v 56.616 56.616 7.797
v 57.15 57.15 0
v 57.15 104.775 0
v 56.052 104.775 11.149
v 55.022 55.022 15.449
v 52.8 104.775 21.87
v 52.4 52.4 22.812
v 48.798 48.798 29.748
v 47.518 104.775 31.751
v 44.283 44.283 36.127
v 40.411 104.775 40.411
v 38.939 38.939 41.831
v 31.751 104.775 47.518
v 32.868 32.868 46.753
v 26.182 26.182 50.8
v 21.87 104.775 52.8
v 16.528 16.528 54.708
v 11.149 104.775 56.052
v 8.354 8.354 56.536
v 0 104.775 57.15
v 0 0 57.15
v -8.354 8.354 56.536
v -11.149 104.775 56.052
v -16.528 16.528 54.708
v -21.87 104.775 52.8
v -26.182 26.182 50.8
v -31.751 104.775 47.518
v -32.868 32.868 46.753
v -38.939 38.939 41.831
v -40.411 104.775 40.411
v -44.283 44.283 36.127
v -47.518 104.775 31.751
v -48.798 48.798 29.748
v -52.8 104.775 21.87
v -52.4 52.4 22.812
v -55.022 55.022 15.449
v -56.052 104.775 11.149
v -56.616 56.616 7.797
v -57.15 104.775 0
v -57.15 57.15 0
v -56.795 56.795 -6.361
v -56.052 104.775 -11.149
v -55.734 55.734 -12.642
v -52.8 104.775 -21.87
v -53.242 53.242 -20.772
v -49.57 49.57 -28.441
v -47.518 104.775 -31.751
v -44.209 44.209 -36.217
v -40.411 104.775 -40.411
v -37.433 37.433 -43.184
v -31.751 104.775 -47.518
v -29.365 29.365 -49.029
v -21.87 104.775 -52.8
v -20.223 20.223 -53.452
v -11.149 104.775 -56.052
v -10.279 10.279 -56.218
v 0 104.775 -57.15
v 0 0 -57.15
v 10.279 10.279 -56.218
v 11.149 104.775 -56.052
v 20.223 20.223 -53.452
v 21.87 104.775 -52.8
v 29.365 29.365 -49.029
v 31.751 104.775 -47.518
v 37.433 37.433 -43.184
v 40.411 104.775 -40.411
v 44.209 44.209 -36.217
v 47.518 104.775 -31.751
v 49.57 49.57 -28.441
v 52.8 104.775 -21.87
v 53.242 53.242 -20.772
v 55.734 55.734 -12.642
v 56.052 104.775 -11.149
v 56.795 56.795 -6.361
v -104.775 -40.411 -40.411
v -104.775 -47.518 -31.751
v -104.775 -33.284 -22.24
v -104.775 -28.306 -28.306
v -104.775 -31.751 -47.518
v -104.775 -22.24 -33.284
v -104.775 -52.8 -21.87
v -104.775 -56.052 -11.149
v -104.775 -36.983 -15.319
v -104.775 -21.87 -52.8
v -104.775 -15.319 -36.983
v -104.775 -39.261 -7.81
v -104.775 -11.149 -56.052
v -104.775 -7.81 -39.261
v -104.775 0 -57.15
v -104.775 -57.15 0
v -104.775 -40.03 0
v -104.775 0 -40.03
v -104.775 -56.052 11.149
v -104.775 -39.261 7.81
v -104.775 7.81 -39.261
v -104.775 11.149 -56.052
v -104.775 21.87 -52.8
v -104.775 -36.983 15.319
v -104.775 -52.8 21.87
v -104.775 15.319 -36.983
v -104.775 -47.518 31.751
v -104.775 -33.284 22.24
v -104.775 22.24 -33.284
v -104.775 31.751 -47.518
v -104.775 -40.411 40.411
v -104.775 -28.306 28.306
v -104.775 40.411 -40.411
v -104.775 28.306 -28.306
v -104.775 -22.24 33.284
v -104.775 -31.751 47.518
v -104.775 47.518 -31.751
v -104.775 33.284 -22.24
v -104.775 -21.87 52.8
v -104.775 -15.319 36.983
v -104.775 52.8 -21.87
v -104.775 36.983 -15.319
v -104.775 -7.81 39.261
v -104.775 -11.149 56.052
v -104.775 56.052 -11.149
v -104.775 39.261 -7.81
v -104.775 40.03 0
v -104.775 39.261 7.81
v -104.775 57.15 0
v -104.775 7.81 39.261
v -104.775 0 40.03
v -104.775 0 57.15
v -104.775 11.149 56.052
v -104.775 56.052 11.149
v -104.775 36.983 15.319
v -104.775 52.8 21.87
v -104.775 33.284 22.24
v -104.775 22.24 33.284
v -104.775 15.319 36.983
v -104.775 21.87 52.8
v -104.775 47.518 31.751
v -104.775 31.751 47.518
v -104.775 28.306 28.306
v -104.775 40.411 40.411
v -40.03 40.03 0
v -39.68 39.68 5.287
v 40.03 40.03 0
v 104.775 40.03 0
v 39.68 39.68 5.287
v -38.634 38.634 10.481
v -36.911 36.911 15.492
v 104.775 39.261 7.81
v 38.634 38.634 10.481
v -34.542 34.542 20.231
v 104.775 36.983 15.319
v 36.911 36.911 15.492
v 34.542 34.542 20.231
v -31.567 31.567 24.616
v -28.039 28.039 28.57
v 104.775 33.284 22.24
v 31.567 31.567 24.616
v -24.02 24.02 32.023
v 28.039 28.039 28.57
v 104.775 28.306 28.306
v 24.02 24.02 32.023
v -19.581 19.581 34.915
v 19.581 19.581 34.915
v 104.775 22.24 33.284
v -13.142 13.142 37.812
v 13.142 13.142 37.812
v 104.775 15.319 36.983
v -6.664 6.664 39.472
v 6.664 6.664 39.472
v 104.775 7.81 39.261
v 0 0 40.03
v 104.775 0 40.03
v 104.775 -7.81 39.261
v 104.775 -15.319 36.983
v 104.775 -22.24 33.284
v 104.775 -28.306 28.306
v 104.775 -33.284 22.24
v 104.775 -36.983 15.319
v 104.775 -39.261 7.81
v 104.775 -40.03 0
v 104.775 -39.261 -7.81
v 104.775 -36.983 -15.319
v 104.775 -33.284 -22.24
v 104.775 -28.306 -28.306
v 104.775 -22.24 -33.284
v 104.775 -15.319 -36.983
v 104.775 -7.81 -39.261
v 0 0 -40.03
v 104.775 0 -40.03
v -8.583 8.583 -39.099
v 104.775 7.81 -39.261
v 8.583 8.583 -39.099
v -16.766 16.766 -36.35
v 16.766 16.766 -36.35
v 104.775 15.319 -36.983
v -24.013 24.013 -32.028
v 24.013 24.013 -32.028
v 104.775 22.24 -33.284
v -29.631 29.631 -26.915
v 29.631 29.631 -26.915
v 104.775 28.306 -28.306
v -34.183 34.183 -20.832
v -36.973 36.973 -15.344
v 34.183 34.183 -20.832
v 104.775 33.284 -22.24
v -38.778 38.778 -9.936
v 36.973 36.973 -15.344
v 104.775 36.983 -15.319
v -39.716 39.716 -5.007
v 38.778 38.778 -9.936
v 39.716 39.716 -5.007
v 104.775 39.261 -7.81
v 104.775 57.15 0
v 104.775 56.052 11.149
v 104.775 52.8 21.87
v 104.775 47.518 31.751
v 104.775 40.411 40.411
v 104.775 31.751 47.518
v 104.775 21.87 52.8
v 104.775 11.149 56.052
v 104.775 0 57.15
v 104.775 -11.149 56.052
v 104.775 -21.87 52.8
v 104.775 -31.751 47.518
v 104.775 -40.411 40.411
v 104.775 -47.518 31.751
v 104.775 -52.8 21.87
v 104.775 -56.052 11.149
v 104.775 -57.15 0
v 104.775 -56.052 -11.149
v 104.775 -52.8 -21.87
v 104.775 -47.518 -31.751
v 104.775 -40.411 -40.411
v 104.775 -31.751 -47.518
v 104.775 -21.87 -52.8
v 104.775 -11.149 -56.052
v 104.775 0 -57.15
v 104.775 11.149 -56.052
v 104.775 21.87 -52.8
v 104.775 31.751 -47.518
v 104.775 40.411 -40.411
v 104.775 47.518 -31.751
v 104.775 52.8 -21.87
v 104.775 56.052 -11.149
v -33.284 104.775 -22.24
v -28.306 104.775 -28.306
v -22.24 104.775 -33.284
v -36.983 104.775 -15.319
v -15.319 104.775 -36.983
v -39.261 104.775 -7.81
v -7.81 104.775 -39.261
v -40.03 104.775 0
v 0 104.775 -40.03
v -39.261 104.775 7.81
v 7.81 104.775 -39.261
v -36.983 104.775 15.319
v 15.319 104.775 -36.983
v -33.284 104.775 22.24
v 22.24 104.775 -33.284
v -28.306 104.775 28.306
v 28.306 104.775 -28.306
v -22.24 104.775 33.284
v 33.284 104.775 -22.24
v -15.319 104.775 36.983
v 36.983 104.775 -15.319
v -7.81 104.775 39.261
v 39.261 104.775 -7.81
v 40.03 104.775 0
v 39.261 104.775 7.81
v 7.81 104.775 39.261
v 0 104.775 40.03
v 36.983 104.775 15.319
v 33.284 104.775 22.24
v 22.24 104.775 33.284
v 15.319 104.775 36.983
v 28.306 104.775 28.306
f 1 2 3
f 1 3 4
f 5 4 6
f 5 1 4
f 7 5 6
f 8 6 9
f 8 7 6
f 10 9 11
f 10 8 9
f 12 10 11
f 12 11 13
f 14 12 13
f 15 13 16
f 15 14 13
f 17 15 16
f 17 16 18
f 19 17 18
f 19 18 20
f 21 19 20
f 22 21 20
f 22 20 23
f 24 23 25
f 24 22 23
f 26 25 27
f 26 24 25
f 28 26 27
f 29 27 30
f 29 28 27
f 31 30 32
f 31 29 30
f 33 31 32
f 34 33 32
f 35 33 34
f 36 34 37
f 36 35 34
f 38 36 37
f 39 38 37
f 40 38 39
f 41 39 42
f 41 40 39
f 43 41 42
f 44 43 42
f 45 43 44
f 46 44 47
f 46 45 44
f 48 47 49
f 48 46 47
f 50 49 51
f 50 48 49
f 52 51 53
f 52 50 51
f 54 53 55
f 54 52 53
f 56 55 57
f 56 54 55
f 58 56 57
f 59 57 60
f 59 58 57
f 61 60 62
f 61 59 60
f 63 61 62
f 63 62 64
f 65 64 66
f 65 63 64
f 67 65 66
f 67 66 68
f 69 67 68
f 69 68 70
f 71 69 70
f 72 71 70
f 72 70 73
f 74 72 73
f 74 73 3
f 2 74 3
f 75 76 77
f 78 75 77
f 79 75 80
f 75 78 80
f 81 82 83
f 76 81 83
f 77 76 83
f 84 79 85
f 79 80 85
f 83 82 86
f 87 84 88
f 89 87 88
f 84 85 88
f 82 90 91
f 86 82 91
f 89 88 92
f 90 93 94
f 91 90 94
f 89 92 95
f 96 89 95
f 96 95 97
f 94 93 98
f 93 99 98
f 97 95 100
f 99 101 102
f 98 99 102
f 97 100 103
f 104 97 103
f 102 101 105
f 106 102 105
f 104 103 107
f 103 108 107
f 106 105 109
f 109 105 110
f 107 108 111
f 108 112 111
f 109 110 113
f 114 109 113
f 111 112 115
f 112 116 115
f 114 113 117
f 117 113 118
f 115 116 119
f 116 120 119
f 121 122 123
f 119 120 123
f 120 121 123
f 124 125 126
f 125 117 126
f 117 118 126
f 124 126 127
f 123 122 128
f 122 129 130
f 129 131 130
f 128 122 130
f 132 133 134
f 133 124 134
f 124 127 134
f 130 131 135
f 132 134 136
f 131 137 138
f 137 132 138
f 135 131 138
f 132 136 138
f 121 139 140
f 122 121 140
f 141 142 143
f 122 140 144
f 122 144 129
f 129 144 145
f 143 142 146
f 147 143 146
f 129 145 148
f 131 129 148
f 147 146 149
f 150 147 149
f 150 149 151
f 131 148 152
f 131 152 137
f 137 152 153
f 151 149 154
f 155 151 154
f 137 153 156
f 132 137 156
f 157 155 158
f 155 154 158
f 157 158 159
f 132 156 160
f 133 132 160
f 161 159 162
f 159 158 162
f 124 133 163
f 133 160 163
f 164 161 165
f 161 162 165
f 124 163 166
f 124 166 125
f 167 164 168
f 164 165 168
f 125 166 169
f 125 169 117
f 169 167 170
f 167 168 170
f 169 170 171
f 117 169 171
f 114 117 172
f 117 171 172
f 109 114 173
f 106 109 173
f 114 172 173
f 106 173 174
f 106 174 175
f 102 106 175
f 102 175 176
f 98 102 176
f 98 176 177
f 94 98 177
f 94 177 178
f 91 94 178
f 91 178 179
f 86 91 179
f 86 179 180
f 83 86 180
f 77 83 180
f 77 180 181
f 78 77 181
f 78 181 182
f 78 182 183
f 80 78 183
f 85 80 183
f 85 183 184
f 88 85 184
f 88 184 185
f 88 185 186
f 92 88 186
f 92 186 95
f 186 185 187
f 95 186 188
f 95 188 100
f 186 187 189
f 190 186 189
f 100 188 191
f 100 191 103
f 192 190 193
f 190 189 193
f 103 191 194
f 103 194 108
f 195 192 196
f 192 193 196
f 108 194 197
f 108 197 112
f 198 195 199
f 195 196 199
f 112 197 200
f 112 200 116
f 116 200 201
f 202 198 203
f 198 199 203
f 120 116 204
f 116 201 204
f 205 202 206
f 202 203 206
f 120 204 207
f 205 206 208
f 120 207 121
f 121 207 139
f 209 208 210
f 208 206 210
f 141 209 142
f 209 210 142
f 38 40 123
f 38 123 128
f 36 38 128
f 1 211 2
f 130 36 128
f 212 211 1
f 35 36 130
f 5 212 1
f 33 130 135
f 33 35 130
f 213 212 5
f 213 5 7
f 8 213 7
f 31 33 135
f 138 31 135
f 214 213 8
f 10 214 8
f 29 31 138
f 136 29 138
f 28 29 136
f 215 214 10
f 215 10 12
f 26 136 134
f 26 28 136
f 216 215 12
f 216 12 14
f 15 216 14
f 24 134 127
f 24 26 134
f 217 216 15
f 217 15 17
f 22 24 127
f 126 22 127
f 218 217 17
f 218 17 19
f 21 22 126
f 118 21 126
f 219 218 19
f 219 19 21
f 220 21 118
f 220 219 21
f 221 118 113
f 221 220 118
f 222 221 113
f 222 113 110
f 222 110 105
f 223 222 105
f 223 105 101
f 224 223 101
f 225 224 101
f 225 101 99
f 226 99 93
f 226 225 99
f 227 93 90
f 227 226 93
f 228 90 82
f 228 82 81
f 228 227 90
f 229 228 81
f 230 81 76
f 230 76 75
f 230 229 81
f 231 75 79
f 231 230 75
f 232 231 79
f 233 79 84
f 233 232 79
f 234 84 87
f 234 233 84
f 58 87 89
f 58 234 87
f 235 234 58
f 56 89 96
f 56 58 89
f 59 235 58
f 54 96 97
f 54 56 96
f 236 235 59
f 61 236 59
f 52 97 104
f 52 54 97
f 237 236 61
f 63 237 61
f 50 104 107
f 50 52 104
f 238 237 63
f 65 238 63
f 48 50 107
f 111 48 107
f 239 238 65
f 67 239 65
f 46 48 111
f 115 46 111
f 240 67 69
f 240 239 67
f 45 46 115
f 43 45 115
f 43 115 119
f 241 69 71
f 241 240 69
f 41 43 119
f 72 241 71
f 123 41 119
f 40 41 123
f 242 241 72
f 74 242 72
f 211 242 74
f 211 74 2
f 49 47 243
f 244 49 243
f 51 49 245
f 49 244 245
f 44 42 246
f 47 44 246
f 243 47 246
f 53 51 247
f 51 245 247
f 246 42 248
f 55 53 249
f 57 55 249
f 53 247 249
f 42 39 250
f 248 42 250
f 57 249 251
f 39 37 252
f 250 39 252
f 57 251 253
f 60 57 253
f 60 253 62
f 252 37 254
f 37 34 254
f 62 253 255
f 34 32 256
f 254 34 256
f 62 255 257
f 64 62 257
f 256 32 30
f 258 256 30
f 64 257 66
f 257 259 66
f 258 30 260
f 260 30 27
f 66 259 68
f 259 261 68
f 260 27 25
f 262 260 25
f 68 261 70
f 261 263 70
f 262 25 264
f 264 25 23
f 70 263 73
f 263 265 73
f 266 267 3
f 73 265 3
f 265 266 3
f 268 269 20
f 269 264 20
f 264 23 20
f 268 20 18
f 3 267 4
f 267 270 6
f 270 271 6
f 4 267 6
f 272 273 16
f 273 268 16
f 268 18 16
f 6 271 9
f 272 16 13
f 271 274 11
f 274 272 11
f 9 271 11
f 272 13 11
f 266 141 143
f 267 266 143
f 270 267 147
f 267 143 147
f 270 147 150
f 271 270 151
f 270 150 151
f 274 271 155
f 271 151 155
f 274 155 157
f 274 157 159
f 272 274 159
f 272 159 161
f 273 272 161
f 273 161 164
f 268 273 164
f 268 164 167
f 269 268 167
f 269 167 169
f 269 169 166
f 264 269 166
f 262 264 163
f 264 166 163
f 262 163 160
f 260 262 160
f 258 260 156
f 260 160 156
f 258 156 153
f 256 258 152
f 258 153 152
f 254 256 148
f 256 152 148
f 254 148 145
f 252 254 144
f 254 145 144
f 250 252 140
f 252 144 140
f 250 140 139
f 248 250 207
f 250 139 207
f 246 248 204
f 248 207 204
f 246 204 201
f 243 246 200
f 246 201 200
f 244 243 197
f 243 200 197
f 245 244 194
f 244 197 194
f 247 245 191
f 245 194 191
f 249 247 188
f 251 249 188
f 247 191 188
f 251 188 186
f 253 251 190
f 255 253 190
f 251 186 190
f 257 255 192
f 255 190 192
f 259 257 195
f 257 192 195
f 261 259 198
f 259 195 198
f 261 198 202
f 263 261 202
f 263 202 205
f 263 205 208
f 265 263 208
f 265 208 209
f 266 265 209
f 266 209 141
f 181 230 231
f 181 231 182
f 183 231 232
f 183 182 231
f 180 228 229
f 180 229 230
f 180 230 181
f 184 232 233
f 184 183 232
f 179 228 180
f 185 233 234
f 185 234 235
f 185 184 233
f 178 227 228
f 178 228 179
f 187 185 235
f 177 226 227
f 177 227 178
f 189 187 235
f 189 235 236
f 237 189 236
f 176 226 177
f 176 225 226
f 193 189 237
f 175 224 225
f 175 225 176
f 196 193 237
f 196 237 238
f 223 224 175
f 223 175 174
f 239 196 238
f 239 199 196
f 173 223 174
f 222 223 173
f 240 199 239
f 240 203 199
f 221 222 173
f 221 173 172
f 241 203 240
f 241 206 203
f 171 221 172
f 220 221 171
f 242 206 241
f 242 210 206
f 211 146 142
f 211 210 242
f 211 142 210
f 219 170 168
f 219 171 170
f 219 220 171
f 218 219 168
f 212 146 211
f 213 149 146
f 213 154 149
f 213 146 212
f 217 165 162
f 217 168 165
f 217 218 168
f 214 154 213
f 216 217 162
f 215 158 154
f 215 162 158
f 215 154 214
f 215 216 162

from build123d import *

# Parameters (mm, degrees)
F2_R          = 57.15
F3_DEPTH      = 104.775
F3_DEPTH_BACK = 104.775
F0_R          = 57.15
F4_DEPTH      = 104.775
F5_R          = 40.0304
F6_DEPTH      = 209.551
F1_R          = 40.0304
F7_DEPTH      = 104.776


with BuildPart() as f3:
    # F2 (on Right) → F3 (new body, two sides)
    with BuildSketch(Plane.YZ) as f3_sk:
        Circle(F2_R)
    extrude(amount=F3_DEPTH)
    extrude(f3_sk.sketch, amount=-F3_DEPTH_BACK)

    # F0 (on Front) → F4 (join)
    with BuildSketch(Plane.XZ):
        Circle(F0_R)
    extrude(amount=-F4_DEPTH)

    # F5 (on face) → F6 (cut, through all)
    with BuildSketch(Plane.YZ.offset(104.775)):
        Circle(F5_R)
    extrude(amount=-F6_DEPTH, mode=Mode.SUBTRACT)

    # F1 (on Front) → F7 (cut, through all)
    with BuildSketch(Plane.XZ):
        Circle(F1_R)
    extrude(amount=-F7_DEPTH, mode=Mode.SUBTRACT)


solid = f3.part
